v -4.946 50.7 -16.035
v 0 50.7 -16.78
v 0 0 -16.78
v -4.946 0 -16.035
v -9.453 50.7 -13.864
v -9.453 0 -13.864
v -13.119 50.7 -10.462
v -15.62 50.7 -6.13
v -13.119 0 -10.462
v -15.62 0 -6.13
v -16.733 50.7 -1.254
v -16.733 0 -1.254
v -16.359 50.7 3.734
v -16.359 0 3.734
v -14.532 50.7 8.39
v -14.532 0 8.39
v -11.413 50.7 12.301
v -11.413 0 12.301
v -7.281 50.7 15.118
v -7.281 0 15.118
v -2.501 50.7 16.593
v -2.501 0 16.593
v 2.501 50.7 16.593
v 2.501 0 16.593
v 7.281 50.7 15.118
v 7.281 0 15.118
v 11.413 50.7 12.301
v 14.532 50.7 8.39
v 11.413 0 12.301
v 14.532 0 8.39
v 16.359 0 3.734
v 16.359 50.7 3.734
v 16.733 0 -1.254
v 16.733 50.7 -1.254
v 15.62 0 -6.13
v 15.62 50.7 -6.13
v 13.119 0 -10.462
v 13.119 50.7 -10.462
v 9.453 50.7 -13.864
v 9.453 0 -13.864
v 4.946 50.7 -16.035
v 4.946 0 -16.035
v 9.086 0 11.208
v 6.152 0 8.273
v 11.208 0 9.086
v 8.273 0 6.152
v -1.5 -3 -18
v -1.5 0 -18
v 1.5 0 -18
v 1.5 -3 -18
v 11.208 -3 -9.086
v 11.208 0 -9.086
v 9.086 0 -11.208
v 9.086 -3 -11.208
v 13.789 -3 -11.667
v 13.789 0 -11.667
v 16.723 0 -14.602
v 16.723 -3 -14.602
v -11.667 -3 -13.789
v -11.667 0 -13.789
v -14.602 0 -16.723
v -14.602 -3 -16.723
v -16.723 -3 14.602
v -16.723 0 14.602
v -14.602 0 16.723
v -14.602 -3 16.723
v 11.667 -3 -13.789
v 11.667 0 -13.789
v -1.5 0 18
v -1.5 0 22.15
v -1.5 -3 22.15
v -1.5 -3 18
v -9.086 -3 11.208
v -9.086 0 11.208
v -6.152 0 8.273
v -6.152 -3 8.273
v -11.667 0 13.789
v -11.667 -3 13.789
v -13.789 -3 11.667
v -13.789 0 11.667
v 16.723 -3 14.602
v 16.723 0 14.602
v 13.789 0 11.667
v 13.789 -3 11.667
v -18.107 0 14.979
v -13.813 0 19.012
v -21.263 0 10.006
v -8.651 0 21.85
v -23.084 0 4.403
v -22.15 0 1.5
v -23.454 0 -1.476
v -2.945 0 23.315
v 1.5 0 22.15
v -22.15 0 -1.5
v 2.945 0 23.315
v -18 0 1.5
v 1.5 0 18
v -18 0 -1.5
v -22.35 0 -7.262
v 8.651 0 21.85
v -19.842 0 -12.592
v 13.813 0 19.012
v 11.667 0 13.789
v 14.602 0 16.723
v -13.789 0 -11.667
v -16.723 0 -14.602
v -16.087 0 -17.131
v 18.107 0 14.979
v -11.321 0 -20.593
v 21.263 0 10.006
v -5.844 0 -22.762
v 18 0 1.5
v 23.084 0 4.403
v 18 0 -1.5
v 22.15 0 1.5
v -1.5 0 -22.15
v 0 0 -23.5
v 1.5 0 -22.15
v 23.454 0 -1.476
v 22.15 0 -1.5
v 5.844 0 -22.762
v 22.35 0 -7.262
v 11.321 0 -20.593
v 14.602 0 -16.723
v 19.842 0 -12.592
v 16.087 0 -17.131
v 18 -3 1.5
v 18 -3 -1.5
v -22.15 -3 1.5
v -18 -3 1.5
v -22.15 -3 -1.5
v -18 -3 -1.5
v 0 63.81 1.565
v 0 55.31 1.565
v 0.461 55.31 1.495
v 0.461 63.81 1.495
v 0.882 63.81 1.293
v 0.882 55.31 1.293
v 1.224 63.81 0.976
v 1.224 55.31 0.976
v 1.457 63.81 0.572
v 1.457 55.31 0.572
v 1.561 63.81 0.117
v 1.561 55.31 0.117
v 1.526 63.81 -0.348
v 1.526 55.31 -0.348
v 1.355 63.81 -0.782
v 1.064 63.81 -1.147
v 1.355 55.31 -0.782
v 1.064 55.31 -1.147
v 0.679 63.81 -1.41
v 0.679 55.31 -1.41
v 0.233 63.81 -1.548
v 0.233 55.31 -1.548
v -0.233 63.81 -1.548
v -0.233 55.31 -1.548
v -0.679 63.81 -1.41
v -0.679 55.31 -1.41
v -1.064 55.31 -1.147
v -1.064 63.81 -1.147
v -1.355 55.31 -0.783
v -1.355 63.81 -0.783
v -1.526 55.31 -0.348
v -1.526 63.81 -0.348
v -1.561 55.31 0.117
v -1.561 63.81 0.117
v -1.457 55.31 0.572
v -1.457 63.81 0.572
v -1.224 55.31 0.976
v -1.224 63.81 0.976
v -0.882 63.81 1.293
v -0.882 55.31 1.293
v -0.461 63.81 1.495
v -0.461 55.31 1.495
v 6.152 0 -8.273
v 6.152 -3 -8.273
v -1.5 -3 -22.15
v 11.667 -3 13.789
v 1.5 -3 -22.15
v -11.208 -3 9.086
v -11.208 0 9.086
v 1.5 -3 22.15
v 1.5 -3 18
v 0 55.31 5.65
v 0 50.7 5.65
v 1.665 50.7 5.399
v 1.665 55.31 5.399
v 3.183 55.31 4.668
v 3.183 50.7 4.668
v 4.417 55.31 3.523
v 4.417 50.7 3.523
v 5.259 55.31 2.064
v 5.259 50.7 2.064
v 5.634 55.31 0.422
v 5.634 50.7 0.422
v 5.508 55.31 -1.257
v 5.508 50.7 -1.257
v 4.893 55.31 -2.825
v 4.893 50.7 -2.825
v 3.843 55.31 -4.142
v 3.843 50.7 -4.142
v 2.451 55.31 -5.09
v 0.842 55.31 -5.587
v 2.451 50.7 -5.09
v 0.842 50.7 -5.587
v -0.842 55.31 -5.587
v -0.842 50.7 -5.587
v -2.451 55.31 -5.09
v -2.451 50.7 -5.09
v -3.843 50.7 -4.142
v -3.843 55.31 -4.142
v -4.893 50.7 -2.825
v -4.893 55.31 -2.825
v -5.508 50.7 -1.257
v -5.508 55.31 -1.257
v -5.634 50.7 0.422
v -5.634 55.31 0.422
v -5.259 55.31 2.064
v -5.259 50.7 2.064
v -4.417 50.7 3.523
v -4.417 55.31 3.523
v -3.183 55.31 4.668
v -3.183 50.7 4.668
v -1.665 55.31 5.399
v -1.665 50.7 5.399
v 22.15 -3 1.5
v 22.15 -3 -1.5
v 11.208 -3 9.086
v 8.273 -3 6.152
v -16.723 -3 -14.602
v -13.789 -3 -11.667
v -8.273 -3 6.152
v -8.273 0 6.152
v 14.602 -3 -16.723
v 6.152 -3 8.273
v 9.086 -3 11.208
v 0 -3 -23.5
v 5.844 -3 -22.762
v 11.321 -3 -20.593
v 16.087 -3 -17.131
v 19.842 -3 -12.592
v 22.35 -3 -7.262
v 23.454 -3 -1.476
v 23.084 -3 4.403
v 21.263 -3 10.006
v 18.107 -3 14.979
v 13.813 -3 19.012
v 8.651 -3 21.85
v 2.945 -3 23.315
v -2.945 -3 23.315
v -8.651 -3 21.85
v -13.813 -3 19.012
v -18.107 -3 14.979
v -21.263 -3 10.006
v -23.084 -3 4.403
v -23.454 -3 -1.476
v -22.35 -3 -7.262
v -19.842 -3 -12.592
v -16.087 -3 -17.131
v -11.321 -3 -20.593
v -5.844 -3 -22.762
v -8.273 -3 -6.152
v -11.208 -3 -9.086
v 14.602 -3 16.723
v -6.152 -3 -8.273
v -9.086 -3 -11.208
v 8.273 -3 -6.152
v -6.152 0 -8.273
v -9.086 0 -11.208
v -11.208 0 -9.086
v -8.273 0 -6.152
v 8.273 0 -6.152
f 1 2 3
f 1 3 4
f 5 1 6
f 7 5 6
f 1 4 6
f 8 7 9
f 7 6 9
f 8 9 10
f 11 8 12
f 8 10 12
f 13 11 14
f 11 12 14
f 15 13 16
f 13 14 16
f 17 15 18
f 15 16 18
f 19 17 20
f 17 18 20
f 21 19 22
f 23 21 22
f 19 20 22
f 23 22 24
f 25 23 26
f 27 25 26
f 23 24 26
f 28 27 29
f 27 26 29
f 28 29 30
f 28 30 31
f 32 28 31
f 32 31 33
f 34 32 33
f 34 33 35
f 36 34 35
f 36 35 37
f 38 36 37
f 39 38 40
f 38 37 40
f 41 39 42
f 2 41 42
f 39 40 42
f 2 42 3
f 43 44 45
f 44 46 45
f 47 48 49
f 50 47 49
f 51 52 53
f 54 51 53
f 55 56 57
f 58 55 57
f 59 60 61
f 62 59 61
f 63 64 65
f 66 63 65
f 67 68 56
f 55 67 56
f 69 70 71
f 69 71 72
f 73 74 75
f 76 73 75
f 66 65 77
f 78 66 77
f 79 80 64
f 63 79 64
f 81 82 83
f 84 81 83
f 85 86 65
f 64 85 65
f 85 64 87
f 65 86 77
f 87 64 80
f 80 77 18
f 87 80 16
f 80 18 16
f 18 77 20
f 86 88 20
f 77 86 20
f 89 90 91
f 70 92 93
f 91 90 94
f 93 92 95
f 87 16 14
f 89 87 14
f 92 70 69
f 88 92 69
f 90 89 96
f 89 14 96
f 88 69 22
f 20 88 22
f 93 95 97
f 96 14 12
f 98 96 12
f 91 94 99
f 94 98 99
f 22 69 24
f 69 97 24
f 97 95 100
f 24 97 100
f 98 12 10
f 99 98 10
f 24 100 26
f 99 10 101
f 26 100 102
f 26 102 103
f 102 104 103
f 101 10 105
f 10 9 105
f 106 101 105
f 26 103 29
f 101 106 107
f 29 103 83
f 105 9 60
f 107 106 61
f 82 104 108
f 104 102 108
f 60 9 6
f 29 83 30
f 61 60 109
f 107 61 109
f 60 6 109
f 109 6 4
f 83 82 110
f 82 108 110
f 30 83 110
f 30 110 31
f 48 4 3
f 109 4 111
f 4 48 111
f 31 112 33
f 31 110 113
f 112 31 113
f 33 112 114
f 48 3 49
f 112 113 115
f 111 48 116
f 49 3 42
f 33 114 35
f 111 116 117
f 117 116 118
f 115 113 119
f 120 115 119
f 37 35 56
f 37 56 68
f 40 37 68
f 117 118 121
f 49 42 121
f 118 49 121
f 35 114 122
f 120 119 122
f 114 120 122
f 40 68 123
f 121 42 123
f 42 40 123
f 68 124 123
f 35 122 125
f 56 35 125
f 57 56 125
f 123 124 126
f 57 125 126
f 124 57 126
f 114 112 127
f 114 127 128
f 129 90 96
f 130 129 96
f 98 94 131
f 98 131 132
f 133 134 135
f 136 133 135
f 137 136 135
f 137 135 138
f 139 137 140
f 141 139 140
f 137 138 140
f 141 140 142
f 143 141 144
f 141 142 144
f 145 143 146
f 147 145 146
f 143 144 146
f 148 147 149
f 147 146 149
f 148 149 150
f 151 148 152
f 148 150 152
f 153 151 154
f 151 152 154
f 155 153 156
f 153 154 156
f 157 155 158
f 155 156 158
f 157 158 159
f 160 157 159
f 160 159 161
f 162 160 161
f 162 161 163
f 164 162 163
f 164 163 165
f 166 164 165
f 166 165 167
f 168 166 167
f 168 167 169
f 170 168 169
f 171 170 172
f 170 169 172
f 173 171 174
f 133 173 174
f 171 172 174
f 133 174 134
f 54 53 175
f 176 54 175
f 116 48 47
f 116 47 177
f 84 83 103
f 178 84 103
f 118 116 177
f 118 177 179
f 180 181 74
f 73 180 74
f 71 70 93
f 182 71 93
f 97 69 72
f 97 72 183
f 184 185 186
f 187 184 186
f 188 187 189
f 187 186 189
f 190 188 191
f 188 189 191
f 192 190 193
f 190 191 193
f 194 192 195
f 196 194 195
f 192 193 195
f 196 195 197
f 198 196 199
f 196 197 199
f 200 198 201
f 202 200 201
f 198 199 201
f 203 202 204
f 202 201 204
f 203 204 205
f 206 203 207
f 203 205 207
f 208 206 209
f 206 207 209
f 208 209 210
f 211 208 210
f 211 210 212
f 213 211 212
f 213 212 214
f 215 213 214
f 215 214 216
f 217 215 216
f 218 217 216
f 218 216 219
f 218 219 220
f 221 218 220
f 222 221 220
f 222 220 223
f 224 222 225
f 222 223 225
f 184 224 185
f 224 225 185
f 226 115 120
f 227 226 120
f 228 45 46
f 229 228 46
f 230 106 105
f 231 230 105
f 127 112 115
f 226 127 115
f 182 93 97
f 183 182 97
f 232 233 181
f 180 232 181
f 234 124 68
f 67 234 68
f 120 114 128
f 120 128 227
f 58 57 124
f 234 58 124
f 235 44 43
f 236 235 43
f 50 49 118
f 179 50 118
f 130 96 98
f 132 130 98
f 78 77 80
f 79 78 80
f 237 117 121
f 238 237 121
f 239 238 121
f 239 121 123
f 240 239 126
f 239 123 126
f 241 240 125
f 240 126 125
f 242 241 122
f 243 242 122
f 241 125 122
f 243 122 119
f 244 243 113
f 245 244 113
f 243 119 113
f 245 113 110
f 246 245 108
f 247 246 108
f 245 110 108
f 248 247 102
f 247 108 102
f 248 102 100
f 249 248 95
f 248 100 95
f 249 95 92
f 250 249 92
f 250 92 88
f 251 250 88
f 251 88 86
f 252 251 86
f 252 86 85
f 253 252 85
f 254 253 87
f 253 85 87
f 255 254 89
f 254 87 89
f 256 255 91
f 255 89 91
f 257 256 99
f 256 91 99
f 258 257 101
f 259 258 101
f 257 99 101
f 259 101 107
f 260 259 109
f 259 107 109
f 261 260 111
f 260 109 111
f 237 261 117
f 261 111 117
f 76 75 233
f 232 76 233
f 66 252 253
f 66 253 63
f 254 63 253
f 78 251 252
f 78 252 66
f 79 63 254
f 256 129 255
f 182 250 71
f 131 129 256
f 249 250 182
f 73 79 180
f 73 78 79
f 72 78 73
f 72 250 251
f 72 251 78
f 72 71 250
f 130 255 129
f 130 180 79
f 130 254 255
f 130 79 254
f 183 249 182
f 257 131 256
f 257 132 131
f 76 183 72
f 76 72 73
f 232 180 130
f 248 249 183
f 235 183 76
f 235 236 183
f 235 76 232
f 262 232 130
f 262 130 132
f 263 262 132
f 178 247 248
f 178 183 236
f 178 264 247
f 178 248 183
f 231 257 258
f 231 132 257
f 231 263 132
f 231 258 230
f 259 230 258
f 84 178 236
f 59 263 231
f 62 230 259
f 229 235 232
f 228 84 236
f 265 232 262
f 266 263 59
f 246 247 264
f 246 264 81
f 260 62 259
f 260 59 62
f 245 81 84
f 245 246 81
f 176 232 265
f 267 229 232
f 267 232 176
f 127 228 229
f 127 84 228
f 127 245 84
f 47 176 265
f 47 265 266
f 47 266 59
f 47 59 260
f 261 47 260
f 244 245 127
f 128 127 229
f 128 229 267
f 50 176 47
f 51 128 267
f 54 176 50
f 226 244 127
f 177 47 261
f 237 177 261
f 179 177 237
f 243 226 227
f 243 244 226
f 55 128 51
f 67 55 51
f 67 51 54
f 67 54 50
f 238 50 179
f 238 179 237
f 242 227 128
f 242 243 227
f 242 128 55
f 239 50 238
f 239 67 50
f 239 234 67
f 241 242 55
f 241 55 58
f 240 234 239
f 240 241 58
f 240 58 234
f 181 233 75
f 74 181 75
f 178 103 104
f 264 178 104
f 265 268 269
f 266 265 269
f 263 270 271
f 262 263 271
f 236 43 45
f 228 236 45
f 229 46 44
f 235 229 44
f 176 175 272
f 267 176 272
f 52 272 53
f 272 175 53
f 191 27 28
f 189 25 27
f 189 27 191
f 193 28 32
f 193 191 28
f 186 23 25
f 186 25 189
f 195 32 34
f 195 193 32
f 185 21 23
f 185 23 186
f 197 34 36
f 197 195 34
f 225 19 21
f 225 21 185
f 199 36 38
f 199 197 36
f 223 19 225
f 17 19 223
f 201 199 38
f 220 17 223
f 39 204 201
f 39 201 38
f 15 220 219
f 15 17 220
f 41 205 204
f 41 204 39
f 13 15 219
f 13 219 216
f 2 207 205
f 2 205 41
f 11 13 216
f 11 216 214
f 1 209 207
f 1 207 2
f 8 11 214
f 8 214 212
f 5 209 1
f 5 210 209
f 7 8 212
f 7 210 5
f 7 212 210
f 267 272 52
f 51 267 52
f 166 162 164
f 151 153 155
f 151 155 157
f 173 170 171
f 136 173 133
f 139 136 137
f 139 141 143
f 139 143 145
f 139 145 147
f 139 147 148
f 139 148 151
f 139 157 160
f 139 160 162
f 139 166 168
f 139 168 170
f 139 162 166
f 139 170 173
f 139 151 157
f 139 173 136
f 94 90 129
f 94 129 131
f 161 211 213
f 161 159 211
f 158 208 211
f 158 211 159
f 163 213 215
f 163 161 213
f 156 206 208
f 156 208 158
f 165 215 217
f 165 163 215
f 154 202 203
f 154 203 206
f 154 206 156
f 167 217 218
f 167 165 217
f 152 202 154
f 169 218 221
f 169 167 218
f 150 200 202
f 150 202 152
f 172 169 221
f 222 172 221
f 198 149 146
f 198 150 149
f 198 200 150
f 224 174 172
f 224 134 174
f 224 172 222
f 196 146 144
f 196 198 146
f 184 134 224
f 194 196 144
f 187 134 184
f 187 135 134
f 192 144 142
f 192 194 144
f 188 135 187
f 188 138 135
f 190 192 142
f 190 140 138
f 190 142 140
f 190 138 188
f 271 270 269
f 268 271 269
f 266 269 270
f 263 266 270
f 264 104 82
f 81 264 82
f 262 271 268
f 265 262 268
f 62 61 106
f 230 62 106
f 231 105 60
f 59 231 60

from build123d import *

# Parameters (mm, degrees)
SKICA1_R                 = 16.78
P_IDAT_VYSUNUT_M1_DEPTH  = 50.7
SKICA2_R                 = 5.65
P_IDAT_VYSUNUT_M2_DEPTH  = 4.61
SKICA3_R                 = 1.565
P_IDAT_VYSUNUT_M3_DEPTH  = 8.5
SKETCH6_R                = 23.5
BOSS_EXTRUDE1_DEPTH      = 3
SKETCH8_W                = 4.15
SKETCH8_H                = 3
SKETCH8_W_2              = 3
SKETCH8_H_2              = 4.15
ODEBRAT_VYSUNUT_M2_DEPTH = 3


with BuildPart() as part:
    # Skica1 → Přidat vysunutím1 (new body)
    with BuildSketch(Plane(origin=(0, 0, 0), x_dir=(1, 0, 0), z_dir=(0, 1, 0))):
        with Locations(Location((0, 0, 0), (0, 0, 90))):
            Circle(SKICA1_R)
    extrude(amount=P_IDAT_VYSUNUT_M1_DEPTH)

    # Skica2 → Přidat vysunutím2 (add)
    with BuildSketch(Plane(origin=(0, 50.7, 0), x_dir=(1, 0, 0), z_dir=(0, 1, 0))):
        with Locations(Location((0, 0, 0), (0, 0, 270))):
            Circle(SKICA2_R)
    extrude(amount=P_IDAT_VYSUNUT_M2_DEPTH)

    # Skica3 → Přidat vysunutím3 (add)
    with BuildSketch(Plane(origin=(0, 55.31, 0), x_dir=(1, 0, 0), z_dir=(0, 1, 0))):
        with Locations(Location((0, 0, 0), (0, 0, 270))):
            Circle(SKICA3_R)
    extrude(amount=P_IDAT_VYSUNUT_M3_DEPTH)

    # Sketch6 → Boss-Extrude1 (add)
    with BuildSketch(Plane.XZ):
        with Locations(Location((0, 0, 0), (0, 0, 270))):
            Circle(SKETCH6_R)
    extrude(amount=BOSS_EXTRUDE1_DEPTH)

    # Sketch8 → Odebrat vysunutím2 (cut)
    with BuildSketch(Plane(origin=(0, 0, 0), x_dir=(1, 0, 0), z_dir=(0, 1, 0))):
        with Locations((20.075, 0)):
            Rectangle(SKETCH8_W, SKETCH8_H)
        Polygon((11.66726189, -13.788582233), (14.601755032, -16.723075375), (16.723075375, -14.601755032), (13.788582233, -11.66726189), align=None)
        with Locations((0, -20.075)):
            Rectangle(SKETCH8_W_2, SKETCH8_H_2)
        Polygon((-13.788582233, -11.66726189), (-16.723075375, -14.601755032), (-14.601755032, -16.723075375), (-11.66726189, -13.788582233), align=None)
        with Locations((-20.075, 0)):
            Rectangle(SKETCH8_W, SKETCH8_H)
        Polygon((-11.66726189, 13.788582233), (-14.601755032, 16.723075375), (-16.723075375, 14.601755032), (-13.788582233, 11.66726189), align=None)
        with Locations((0, 20.075)):
            Rectangle(SKETCH8_W_2, SKETCH8_H_2)
        Polygon((13.788582233, 11.66726189), (16.723075375, 14.601755032), (14.601755032, 16.723075375), (11.66726189, 13.788582233), align=None)
        Polygon((6.151828996, -8.27314934), (9.086322138, -11.207642482), (11.207642482, -9.086322138), (8.27314934, -6.151828996), align=None)
        Polygon((-8.27314934, -6.151828996), (-11.207642482, -9.086322138), (-9.086322138, -11.207642482), (-6.151828996, -8.27314934), align=None)
        Polygon((-6.151828996, 8.27314934), (-9.086322138, 11.207642482), (-11.207642482, 9.086322138), (-8.27314934, 6.151828996), align=None)
        Polygon((8.27314934, 6.151828996), (11.207642482, 9.086322138), (9.086322138, 11.207642482), (6.151828996, 8.27314934), align=None)
    extrude(amount=-ODEBRAT_VYSUNUT_M2_DEPTH, mode=Mode.SUBTRACT)


solid = part.part
